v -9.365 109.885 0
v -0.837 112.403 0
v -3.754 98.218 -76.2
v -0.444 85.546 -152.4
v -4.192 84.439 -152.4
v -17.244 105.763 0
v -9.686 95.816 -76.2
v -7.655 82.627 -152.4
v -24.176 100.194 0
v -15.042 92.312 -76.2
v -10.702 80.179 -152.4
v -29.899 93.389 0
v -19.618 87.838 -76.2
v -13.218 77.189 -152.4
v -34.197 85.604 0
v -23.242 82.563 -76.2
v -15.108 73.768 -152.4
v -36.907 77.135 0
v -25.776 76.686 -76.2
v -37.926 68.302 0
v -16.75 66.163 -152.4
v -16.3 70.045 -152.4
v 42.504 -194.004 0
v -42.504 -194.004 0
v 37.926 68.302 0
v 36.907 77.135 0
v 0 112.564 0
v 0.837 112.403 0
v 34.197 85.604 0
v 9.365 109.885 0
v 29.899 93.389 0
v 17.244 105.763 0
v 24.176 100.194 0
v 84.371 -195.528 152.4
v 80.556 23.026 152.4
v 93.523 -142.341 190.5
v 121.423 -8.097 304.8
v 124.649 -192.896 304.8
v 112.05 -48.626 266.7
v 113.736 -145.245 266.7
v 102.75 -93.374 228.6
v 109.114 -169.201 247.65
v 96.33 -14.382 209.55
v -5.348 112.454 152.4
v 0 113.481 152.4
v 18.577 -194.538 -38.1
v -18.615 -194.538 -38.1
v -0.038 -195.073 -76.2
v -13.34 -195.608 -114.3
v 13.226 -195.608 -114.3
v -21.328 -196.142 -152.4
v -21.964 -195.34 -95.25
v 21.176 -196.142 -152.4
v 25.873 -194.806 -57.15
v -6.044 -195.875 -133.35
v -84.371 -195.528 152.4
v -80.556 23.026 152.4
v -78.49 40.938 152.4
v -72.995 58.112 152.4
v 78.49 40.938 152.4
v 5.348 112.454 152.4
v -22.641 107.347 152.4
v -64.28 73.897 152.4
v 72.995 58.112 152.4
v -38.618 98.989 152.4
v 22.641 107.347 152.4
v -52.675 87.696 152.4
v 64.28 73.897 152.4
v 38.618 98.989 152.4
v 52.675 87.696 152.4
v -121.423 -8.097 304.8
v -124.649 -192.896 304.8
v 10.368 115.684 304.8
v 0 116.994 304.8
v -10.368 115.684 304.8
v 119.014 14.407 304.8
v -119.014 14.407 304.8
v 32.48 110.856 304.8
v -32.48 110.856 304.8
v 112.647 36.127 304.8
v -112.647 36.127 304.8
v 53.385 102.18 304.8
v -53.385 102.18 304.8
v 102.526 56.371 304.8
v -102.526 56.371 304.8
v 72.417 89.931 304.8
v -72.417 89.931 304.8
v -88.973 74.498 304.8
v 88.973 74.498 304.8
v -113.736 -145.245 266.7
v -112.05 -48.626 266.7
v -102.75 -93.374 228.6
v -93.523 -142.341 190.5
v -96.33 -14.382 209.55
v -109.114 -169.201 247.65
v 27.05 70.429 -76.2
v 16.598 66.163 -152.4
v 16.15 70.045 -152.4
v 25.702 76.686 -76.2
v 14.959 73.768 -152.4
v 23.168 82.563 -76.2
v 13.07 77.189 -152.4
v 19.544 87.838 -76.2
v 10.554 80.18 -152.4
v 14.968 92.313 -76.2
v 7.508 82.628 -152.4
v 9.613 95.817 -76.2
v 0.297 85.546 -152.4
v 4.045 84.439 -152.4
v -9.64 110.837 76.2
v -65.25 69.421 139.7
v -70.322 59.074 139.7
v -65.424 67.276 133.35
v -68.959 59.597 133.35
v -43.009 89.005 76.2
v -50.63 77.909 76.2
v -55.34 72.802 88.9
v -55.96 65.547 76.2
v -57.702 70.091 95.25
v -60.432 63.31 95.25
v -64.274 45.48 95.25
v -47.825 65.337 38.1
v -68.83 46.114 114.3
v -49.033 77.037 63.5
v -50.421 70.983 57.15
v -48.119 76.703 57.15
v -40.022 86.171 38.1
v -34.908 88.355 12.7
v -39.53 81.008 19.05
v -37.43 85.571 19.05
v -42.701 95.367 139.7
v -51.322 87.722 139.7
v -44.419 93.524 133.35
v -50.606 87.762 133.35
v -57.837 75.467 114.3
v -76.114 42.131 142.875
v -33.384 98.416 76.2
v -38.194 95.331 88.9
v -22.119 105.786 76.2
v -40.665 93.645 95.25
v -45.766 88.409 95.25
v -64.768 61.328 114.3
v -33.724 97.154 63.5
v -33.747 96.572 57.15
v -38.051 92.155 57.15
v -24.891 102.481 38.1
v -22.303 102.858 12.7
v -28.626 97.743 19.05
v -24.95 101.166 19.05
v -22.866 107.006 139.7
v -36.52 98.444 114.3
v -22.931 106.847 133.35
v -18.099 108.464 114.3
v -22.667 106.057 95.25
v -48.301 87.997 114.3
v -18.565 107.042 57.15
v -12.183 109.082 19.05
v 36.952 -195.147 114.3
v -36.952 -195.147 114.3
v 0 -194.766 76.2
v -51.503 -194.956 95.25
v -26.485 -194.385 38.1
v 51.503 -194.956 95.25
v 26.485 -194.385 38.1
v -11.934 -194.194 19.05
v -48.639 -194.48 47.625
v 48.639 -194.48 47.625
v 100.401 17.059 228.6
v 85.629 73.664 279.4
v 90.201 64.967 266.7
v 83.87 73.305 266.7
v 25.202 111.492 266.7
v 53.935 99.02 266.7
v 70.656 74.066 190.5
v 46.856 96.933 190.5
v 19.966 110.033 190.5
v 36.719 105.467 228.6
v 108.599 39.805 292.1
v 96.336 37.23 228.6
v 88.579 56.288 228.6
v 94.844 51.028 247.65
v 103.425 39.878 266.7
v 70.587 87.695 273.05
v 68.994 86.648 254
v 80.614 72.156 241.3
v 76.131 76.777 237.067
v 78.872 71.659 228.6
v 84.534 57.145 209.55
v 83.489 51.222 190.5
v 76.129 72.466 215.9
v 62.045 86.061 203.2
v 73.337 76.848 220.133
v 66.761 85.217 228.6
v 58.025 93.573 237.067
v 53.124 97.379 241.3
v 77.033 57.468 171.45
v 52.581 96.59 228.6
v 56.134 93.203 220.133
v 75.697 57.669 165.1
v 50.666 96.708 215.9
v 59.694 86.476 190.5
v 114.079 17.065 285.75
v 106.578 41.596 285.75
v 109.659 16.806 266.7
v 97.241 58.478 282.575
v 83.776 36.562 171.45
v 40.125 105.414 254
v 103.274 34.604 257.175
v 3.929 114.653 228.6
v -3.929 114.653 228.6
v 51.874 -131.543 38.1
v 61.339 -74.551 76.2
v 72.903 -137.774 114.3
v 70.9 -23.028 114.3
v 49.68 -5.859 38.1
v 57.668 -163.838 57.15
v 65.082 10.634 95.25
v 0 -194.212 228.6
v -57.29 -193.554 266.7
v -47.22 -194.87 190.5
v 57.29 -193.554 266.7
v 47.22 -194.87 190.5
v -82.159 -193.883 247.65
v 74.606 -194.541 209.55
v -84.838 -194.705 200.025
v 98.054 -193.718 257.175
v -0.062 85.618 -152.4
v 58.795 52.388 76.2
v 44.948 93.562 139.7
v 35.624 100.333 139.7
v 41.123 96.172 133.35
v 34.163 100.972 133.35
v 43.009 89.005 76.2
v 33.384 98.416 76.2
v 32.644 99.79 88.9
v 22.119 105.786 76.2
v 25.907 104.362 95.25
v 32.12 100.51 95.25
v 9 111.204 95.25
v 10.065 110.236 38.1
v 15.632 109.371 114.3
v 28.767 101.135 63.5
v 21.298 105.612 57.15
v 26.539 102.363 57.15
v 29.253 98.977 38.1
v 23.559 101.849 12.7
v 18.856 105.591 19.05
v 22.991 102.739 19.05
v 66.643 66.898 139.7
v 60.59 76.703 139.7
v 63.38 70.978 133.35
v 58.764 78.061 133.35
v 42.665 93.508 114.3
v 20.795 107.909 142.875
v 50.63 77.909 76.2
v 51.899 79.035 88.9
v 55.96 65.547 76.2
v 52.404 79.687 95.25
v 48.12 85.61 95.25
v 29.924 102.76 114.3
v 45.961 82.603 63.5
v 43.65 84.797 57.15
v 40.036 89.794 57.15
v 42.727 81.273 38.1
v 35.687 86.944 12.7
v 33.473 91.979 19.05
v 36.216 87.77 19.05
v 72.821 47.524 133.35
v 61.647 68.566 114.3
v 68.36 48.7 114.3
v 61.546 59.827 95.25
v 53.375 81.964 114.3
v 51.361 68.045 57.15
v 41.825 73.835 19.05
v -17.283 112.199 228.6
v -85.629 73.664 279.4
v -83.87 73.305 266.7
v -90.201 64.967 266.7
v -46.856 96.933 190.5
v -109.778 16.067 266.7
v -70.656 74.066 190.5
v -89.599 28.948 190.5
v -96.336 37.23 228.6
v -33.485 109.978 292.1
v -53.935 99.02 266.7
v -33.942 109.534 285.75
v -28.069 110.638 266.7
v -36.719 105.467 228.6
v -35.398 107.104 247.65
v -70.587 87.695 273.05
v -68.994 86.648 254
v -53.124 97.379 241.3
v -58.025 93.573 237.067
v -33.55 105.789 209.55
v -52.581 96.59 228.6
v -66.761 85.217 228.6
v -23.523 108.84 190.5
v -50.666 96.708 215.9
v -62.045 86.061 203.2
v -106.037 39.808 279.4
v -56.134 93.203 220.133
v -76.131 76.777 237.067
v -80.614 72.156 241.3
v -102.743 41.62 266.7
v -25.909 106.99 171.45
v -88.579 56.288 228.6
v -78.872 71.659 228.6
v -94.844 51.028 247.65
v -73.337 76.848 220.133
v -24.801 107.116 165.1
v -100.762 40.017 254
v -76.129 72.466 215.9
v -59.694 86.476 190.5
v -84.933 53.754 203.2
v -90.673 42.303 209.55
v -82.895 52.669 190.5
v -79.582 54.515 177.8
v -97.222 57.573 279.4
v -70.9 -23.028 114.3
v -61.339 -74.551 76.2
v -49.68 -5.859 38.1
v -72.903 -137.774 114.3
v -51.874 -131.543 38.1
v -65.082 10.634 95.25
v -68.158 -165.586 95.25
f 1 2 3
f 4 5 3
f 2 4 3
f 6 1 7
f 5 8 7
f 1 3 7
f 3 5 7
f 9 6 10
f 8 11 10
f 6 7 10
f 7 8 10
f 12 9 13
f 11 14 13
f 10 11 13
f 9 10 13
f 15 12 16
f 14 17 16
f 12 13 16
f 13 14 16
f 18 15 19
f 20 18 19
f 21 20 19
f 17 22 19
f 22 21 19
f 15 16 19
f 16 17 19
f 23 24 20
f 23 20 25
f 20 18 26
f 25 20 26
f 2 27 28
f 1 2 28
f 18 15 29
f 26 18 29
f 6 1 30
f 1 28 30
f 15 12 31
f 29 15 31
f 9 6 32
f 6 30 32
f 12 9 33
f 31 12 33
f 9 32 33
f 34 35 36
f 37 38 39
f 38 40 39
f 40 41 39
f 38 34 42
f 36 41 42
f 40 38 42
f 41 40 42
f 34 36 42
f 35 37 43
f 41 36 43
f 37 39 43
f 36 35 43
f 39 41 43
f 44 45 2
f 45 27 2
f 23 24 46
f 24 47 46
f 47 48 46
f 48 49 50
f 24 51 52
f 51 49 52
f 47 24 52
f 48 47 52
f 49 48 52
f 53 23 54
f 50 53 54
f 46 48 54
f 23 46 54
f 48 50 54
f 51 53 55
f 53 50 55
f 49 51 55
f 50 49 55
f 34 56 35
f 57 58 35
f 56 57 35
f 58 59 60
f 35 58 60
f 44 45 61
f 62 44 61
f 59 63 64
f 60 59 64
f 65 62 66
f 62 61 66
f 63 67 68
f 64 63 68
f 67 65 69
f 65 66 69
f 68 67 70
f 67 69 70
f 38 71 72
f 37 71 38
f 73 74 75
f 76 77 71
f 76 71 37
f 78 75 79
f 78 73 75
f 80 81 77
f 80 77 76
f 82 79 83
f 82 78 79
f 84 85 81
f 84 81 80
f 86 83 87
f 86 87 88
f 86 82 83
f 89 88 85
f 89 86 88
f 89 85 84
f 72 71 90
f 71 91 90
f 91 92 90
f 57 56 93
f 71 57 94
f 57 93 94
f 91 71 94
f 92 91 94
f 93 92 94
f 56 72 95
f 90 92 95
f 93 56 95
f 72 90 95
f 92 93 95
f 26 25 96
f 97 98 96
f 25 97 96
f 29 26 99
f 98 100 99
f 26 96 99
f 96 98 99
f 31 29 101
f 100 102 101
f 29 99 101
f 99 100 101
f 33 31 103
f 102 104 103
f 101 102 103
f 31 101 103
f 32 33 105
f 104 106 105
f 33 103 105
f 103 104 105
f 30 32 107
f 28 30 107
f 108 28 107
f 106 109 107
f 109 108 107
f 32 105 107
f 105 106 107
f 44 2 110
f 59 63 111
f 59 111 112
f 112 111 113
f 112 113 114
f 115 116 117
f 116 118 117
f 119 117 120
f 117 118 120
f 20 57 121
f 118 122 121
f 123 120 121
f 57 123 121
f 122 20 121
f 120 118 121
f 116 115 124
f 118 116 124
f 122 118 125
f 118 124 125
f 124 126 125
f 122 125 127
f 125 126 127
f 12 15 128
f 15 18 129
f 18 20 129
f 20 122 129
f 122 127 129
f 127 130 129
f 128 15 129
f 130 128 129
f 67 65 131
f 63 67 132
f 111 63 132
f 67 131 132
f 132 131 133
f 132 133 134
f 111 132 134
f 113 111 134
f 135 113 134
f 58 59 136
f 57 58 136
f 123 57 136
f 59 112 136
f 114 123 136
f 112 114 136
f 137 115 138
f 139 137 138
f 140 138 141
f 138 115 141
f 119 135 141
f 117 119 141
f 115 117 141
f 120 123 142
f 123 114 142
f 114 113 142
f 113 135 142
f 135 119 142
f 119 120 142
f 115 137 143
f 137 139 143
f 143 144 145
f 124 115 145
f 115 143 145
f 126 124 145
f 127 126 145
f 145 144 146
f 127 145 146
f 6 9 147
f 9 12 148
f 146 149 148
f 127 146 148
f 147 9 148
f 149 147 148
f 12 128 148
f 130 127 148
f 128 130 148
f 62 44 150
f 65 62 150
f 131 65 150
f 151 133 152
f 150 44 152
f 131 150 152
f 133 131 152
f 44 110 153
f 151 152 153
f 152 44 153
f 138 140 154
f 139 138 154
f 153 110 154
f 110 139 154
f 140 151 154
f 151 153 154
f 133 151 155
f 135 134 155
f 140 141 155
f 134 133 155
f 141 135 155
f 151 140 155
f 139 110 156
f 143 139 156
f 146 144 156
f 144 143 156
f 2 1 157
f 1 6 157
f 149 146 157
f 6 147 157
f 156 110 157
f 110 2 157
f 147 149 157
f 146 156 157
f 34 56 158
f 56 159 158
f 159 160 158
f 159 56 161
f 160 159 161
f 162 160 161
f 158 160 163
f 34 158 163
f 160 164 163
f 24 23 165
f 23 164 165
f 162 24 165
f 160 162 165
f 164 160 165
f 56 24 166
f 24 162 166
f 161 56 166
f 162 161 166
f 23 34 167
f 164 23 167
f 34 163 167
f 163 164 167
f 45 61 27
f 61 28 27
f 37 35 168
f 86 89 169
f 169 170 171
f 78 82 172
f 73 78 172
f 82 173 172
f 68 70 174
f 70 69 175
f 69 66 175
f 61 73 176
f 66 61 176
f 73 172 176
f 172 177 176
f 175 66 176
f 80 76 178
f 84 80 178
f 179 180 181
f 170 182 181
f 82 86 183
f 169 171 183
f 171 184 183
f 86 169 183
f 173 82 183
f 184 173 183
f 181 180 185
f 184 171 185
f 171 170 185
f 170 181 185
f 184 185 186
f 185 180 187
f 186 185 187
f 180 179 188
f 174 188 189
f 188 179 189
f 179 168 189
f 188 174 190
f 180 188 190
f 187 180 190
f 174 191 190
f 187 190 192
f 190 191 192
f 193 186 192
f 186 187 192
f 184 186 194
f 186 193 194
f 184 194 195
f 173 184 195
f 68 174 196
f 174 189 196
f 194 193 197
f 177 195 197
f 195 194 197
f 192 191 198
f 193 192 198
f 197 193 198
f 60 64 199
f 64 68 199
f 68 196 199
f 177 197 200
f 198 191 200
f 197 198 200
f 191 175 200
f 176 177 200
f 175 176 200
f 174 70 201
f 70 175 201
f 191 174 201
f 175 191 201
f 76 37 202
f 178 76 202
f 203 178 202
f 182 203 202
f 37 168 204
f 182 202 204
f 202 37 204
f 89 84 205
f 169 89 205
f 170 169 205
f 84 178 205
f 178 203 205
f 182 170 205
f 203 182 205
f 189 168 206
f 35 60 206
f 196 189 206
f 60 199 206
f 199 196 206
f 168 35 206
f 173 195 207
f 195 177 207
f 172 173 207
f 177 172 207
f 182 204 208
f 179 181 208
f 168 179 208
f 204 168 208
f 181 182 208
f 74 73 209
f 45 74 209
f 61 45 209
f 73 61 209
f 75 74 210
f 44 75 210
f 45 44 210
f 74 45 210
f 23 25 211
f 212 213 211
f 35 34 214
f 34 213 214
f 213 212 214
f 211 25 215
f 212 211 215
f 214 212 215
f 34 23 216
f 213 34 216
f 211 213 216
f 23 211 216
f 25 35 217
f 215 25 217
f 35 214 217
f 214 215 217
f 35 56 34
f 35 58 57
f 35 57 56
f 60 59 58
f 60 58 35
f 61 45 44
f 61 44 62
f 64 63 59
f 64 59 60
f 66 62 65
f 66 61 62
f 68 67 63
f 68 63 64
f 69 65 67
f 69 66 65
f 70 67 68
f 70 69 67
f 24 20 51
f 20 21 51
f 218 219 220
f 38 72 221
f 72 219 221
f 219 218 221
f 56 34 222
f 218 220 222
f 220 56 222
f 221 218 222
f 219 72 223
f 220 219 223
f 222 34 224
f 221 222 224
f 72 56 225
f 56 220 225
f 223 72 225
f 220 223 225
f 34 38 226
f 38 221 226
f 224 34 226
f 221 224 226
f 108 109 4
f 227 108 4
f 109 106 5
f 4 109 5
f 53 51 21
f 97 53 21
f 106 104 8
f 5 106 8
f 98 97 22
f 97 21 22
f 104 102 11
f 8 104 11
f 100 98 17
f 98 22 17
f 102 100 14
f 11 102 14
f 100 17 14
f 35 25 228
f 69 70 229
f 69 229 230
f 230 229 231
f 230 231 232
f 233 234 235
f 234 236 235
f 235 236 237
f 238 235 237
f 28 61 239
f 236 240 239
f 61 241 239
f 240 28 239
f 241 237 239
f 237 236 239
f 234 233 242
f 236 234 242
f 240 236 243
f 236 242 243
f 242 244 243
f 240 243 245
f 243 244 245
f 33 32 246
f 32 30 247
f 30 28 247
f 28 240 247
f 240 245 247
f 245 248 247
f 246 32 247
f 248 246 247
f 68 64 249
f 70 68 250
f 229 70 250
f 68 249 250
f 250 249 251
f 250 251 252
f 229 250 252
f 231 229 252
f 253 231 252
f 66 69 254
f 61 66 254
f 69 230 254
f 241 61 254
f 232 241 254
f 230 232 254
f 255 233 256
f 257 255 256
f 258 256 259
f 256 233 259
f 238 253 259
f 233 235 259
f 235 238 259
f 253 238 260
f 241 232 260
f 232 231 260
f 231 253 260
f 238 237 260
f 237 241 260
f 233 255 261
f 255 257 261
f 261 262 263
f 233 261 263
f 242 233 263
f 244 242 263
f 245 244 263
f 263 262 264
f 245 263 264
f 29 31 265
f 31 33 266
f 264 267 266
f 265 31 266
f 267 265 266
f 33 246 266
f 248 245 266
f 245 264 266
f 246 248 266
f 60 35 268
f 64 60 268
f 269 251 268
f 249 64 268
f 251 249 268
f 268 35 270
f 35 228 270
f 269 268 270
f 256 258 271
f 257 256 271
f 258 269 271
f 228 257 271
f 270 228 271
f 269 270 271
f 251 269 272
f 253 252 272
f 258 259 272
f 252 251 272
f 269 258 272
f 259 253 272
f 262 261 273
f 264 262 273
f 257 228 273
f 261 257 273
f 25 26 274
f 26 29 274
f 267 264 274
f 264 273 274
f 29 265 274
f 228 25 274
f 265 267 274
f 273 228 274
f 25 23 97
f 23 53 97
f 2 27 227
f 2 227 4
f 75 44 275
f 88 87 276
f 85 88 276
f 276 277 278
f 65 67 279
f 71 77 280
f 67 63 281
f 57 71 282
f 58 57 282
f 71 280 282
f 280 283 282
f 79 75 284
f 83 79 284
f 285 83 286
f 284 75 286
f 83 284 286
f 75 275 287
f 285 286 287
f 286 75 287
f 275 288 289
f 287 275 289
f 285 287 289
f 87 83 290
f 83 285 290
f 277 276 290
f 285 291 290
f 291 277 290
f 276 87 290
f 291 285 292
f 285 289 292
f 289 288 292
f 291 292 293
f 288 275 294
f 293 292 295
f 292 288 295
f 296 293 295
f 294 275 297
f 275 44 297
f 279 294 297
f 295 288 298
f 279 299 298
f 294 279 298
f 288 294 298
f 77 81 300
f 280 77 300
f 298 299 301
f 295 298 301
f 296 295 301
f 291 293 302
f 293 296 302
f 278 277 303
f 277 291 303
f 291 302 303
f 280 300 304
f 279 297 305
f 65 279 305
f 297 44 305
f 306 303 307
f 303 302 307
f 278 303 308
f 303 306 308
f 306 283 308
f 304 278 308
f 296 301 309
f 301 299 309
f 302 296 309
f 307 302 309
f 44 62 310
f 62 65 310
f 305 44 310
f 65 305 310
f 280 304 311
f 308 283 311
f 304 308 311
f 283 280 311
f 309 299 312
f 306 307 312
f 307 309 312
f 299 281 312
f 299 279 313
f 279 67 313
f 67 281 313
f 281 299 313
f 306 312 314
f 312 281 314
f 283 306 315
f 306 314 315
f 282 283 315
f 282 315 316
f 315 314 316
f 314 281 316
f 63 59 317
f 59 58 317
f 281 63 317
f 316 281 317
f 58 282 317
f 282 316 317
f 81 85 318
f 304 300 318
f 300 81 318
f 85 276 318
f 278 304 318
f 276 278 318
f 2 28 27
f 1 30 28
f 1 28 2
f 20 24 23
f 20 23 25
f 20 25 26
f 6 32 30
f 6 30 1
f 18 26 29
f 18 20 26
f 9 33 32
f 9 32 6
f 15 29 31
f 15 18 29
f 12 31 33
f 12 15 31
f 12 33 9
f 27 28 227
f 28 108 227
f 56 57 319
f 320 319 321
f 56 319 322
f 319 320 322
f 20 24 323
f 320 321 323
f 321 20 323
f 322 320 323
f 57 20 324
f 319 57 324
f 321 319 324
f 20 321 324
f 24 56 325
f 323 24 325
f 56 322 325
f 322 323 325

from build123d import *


# Not quite as in the source:
# - ends of sketch curves that miss each other by under 0.0002 mm in the source are joined


with BuildPart() as f7:
    # F3 (on offset) → F7 section 0
    with BuildSketch(Plane.XY.offset(304.8)):
        with BuildLine():
            Line((-124.6491538, -192.8961344), (124.6491538, -192.8961344))
            Line((124.6491538, -192.8961344), (121.4234808, -8.0974946))
            ThreePointArc((121.4234808, -8.0974946), (88.9728976434, 74.4979752801), (10.3676203953, 115.6836712928))
            Line((10.3676203953, 115.6836712928), (0, 116.9940256))
            Line((0, 116.9940256), (-10.3676196, 115.683665))
            ThreePointArc((-10.3676196, 115.683665), (-88.9728976434, 74.4979752801), (-121.4234675032, -8.0974948321))
            Line((-121.4234675032, -8.0974948321), (-124.6491538, -192.8961344))
        make_face()
    # F4 (on offset) → F7 section 1
    with BuildSketch(Plane.XY.offset(152.4)):
        with BuildLine():
            Line((-84.3707736, -195.5275744), (84.3707736, -195.5275744))
            Line((84.3707736, -195.5275744), (80.5558968, 23.025862))
            ThreePointArc((80.5558968, 23.025862), (58.8138267519, 81.0794433275), (5.3479189082, 112.4535200809))
            Line((5.3479189082, 112.4535200809), (0, 113.4807484))
            Line((0, 113.4807484), (-5.3479192, 112.4535216))
            ThreePointArc((-5.3479192, 112.4535216), (-58.8138267519, 81.0794433275), (-80.5558986997, 23.0258620332))
            Line((-80.5558986997, 23.0258620332), (-84.3707736, -195.5275744))
        make_face()
    loft()


with BuildPart() as f8:
    # F4 (on offset) → F8 section 0
    with BuildSketch(Plane.XY.offset(152.4)):
        with BuildLine():
            Line((-84.3707736, -195.5275744), (84.3707736, -195.5275744))
            Line((84.3707736, -195.5275744), (80.5558968, 23.025862))
            ThreePointArc((80.5558968, 23.025862), (58.8138267519, 81.0794433275), (5.3479189082, 112.4535200809))
            Line((5.3479189082, 112.4535200809), (0, 113.4807484))
            Line((0, 113.4807484), (-5.3479192, 112.4535216))
            ThreePointArc((-5.3479192, 112.4535216), (-58.8138267519, 81.0794433275), (-80.5558986997, 23.0258620332))
            Line((-80.5558986997, 23.0258620332), (-84.3707736, -195.5275744))
        make_face()
    # F5 (on Top) → F8 section 1
    with BuildSketch(Plane.XY):
        with BuildLine():
            Line((0, 112.5638084), (-0.83693, 112.4030518))
            ThreePointArc((-0.83693, 112.4030518), (-27.2036803488, 96.9309041513), (-37.9258027274, 68.3017429289))
            Line((-37.9258027274, 68.3017429289), (-42.50436, -194.0035744))
            Line((-42.50436, -194.0035744), (42.50436, -194.0035744))
            Line((42.50436, -194.0035744), (37.9258068, 68.301743))
            ThreePointArc((37.9258068, 68.301743), (27.2036803488, 96.9309041513), (0.8369291121, 112.4030471776))
            Line((0.8369291121, 112.4030471776), (0, 112.5638084))
        make_face()
    loft()


with BuildPart() as f9:
    # F5 (on Top) → F9 section 0
    with BuildSketch(Plane.XY):
        with BuildLine():
            Line((0, 112.5638084), (-0.83693, 112.4030518))
            ThreePointArc((-0.83693, 112.4030518), (-27.2036803488, 96.9309041513), (-37.9258027274, 68.3017429289))
            Line((-37.9258027274, 68.3017429289), (-42.50436, -194.0035744))
            Line((-42.50436, -194.0035744), (42.50436, -194.0035744))
            Line((42.50436, -194.0035744), (37.9258068, 68.301743))
            ThreePointArc((37.9258068, 68.301743), (27.2036803488, 96.9309041513), (0.8369291121, 112.4030471776))
            Line((0.8369291121, 112.4030471776), (0, 112.5638084))
        make_face()
    # F6 (on offset) → F9 section 1
    with BuildSketch(Plane.XY.offset(-152.4)):
        with BuildLine():
            Line((-16.7496236, 66.163063), (-21.3281768, -196.1422544))
            Line((-21.3281768, -196.1422544), (21.1761832, -196.1422544))
            Line((21.1761832, -196.1422544), (16.59763, 66.163063))
            ThreePointArc((16.59763, 66.163063), (11.8850820526, 78.7459853527), (0.2965144503, 85.5462079895))
            Line((0.2965144503, 85.5462079895), (-0.0618236, 85.6184216))
            Line((-0.0618236, 85.6184216), (-0.443738, 85.5461332))
            ThreePointArc((-0.443738, 85.5461332), (-12.0328808906, 78.7452835073), (-16.7496236, 66.163063))
        make_face()
    loft()


solid = Compound([f7.part, f8.part, f9.part])
